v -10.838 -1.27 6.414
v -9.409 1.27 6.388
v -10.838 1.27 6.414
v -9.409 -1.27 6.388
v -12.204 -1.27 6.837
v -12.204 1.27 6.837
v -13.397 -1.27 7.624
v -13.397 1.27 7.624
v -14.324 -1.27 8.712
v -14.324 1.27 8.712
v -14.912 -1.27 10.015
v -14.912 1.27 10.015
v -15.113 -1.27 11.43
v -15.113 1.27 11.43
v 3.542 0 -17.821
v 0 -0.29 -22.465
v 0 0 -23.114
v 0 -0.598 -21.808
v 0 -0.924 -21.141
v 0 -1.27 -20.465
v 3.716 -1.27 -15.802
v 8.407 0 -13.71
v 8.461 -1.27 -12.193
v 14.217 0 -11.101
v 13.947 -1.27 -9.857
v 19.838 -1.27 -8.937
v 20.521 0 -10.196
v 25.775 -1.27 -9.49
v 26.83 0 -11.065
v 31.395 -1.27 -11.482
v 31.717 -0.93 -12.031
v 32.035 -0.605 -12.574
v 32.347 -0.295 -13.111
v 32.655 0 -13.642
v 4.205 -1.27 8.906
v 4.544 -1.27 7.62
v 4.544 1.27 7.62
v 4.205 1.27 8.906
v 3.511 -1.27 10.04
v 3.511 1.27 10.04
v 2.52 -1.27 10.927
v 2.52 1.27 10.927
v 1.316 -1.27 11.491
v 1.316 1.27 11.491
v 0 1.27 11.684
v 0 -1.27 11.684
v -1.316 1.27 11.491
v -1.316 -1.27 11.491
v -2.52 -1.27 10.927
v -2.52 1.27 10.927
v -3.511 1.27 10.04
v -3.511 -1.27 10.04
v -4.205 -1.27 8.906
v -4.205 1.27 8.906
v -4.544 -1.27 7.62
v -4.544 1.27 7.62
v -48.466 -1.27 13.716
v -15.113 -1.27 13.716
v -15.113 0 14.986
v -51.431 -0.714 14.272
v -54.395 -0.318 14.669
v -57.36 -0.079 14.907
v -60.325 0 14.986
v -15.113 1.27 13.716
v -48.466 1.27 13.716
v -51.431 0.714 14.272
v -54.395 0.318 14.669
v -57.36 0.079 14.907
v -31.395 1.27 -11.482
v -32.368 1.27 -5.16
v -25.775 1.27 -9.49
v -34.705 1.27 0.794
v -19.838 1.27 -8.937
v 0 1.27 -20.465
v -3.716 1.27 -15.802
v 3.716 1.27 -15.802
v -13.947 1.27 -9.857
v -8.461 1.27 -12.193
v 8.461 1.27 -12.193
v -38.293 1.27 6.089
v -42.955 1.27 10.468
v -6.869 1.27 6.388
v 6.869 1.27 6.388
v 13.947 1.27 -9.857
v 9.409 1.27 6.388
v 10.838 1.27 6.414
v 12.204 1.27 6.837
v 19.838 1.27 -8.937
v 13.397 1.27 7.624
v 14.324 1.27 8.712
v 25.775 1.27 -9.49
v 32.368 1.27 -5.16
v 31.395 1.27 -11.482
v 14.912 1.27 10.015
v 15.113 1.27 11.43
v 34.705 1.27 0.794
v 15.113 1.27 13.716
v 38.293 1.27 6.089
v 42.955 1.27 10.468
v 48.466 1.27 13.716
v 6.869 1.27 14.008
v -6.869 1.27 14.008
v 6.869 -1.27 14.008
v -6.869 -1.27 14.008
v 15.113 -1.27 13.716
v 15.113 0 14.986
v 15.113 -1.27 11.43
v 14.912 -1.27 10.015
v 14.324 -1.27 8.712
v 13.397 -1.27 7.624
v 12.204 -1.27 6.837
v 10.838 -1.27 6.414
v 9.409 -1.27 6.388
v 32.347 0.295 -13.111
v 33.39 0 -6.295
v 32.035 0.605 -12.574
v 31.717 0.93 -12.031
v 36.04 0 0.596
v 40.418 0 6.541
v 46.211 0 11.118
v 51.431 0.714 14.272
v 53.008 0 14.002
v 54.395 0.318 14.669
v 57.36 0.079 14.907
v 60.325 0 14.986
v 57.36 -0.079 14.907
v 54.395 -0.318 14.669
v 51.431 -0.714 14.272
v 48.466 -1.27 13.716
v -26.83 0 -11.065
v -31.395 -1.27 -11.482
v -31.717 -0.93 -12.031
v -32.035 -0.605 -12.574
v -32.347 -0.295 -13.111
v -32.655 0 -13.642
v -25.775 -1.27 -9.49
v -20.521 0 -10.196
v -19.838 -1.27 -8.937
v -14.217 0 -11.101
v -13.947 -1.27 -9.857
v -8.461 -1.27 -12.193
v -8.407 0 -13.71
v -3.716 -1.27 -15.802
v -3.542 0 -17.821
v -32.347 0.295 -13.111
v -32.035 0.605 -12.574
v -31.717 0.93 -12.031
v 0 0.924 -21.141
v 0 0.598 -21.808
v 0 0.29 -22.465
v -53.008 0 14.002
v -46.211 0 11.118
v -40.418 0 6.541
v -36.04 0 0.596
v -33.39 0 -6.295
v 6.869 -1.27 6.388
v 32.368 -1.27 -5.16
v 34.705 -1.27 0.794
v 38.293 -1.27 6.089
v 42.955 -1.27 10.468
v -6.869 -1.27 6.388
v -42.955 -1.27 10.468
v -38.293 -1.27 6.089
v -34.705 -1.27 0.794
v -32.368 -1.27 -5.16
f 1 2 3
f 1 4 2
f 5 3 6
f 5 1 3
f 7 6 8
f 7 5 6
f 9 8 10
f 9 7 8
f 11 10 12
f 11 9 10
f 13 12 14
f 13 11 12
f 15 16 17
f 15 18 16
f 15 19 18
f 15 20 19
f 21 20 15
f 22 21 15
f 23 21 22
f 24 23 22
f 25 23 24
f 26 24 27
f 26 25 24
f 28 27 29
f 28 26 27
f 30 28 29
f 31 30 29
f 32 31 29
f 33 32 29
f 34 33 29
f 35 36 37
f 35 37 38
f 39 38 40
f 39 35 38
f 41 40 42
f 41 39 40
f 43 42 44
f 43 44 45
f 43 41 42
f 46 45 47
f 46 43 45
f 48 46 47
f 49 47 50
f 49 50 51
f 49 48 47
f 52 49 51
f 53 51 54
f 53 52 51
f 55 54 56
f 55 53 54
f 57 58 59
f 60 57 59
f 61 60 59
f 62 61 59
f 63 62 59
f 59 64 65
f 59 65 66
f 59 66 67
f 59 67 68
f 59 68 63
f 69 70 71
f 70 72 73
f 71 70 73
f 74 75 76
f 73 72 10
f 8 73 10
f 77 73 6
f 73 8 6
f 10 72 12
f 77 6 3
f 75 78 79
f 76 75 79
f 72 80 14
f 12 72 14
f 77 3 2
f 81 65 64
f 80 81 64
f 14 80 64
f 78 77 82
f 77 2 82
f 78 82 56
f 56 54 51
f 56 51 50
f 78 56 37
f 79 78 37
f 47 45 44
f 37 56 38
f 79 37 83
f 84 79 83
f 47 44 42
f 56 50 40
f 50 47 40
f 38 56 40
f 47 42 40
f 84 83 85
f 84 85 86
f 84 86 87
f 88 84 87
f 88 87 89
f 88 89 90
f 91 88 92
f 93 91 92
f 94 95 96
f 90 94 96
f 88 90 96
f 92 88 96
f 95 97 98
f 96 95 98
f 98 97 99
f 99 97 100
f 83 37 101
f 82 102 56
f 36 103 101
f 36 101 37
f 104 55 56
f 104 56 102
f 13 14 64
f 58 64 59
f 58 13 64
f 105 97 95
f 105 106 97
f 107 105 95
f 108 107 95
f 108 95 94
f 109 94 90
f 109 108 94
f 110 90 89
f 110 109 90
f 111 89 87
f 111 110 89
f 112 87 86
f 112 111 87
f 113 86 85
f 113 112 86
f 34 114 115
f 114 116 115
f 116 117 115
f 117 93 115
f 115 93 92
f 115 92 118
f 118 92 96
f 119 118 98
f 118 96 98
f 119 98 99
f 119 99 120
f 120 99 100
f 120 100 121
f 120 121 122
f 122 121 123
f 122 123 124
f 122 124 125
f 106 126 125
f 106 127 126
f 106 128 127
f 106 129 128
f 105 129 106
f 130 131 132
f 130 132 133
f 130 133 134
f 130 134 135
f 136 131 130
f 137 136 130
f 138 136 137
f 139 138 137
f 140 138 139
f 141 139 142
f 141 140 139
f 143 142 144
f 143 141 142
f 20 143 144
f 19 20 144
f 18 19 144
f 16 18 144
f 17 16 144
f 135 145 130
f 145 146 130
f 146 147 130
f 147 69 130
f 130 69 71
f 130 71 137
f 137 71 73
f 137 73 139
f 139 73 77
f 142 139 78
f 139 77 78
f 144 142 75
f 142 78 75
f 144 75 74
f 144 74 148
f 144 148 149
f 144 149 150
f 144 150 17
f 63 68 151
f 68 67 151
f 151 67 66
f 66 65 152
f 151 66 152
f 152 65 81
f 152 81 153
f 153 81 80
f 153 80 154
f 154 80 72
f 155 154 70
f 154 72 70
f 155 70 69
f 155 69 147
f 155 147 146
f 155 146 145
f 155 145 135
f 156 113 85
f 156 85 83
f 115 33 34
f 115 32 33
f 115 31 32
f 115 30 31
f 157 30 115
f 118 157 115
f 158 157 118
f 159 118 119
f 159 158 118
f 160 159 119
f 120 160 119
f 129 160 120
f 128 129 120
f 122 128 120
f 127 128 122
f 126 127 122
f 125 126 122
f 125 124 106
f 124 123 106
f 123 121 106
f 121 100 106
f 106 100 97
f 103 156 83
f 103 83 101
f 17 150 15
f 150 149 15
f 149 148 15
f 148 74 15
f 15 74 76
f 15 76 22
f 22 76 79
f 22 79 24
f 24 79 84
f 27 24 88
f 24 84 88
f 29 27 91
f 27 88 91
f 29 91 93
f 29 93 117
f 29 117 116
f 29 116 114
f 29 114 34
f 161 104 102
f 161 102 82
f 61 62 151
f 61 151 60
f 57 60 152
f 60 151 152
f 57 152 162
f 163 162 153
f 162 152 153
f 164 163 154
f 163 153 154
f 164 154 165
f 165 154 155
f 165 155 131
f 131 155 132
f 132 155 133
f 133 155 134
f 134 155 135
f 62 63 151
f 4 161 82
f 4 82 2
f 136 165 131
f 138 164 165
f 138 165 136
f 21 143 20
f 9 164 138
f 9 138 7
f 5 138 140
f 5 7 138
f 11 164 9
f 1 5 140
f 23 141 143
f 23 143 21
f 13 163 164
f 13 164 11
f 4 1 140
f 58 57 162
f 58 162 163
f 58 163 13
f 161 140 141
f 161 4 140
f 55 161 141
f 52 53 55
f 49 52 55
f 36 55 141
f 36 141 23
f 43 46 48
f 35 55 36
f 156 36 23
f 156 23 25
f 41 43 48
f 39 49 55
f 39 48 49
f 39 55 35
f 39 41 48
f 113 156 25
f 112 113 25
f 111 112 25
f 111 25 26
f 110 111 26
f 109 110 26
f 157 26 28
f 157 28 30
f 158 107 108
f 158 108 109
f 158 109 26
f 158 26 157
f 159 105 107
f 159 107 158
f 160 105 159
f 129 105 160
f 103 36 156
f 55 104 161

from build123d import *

# Parameters (mm, degrees)
F1_DEPTH = 1.27
F2_SIZE  = 1.26999


# Not quite as in the source:
# - a fillet or chamfer is up to 0.001 mm smaller than in the source, because OpenCascade refuses the exact size
# - a feature names something its author has since deleted; it is built from what else it names


with BuildPart() as f1:
    # F0 (on Front) → F1 (new body, symmetric)
    with BuildSketch(Plane.XZ):
        with BuildLine():
            Line((-15.113, 14.986), (-60.325, 14.986))
            ThreePointArc((-60.325, 14.986), (-40.4178225843, 6.541072822), (-32.6550259817, -13.6418778197))
            ThreePointArc((-32.6550259817, -13.6418778197), (-14.2166113122, -11.1006310534), (0, -23.114))
            ThreePointArc((0, -23.114), (14.2166113122, -11.1006310534), (32.6550259817, -13.6418778197))
            ThreePointArc((32.6550259817, -13.6418778197), (40.4178225843, 6.541072822), (60.325, 14.986))
            Line((60.325, 14.986), (15.113, 14.986))
            Line((15.113, 14.986), (15.113, 11.43))
            ThreePointArc((15.113, 11.43), (13.3972241951, 7.623637489), (9.4089072578, 6.3884815532))
            Line((9.4089072578, 6.3884815532), (6.8689072578, 6.3884815532))
            Line((6.8689072578, 6.3884815532), (6.8689072578, 14.0084815532))
            Line((6.8689072578, 14.0084815532), (4.5436901303, 7.62))
            ThreePointArc((4.5436901303, 7.62), (0, 11.684), (-4.5436901303, 7.62))
            Line((-4.5436901303, 7.62), (-6.8689072578, 14.0084815532))
            Line((-6.8689072578, 14.0084815532), (-6.8689072578, 6.3884815532))
            Line((-6.8689072578, 6.3884815532), (-9.4089072578, 6.3884815532))
            ThreePointArc((-9.4089072578, 6.3884815532), (-13.3972241951, 7.623637489), (-15.113, 11.43))
            Line((-15.113, 11.43), (-15.113, 14.986))
        make_face()
    extrude(amount=F1_DEPTH, both=True)

    # F2 (size 1.27 in the source; OpenCascade refuses exactly that, so slightly less here)
    f2_edges = [f1.edges().sort_by_distance(p)[0] for p in [
        (-40.417823, -1.27, 6.541073),
        (-37.719, -1.27, 14.986),
        (-14.216611, -1.27, -11.100631),
        (-14.216611, 1.27, -11.100631),
        (-40.417823, 1.27, 6.541073),
        (-37.719, 1.27, 14.986),
        (37.719, -1.27, 14.986),
        (40.417823, -1.27, 6.541073),
        (14.216611, -1.27, -11.100631),
        (37.719, 1.27, 14.986),
        (40.417823, 1.27, 6.541073),
        (14.216611, 1.27, -11.100631),
    ]]
    chamfer(f2_edges, length=F2_SIZE)


solid = f1.part
